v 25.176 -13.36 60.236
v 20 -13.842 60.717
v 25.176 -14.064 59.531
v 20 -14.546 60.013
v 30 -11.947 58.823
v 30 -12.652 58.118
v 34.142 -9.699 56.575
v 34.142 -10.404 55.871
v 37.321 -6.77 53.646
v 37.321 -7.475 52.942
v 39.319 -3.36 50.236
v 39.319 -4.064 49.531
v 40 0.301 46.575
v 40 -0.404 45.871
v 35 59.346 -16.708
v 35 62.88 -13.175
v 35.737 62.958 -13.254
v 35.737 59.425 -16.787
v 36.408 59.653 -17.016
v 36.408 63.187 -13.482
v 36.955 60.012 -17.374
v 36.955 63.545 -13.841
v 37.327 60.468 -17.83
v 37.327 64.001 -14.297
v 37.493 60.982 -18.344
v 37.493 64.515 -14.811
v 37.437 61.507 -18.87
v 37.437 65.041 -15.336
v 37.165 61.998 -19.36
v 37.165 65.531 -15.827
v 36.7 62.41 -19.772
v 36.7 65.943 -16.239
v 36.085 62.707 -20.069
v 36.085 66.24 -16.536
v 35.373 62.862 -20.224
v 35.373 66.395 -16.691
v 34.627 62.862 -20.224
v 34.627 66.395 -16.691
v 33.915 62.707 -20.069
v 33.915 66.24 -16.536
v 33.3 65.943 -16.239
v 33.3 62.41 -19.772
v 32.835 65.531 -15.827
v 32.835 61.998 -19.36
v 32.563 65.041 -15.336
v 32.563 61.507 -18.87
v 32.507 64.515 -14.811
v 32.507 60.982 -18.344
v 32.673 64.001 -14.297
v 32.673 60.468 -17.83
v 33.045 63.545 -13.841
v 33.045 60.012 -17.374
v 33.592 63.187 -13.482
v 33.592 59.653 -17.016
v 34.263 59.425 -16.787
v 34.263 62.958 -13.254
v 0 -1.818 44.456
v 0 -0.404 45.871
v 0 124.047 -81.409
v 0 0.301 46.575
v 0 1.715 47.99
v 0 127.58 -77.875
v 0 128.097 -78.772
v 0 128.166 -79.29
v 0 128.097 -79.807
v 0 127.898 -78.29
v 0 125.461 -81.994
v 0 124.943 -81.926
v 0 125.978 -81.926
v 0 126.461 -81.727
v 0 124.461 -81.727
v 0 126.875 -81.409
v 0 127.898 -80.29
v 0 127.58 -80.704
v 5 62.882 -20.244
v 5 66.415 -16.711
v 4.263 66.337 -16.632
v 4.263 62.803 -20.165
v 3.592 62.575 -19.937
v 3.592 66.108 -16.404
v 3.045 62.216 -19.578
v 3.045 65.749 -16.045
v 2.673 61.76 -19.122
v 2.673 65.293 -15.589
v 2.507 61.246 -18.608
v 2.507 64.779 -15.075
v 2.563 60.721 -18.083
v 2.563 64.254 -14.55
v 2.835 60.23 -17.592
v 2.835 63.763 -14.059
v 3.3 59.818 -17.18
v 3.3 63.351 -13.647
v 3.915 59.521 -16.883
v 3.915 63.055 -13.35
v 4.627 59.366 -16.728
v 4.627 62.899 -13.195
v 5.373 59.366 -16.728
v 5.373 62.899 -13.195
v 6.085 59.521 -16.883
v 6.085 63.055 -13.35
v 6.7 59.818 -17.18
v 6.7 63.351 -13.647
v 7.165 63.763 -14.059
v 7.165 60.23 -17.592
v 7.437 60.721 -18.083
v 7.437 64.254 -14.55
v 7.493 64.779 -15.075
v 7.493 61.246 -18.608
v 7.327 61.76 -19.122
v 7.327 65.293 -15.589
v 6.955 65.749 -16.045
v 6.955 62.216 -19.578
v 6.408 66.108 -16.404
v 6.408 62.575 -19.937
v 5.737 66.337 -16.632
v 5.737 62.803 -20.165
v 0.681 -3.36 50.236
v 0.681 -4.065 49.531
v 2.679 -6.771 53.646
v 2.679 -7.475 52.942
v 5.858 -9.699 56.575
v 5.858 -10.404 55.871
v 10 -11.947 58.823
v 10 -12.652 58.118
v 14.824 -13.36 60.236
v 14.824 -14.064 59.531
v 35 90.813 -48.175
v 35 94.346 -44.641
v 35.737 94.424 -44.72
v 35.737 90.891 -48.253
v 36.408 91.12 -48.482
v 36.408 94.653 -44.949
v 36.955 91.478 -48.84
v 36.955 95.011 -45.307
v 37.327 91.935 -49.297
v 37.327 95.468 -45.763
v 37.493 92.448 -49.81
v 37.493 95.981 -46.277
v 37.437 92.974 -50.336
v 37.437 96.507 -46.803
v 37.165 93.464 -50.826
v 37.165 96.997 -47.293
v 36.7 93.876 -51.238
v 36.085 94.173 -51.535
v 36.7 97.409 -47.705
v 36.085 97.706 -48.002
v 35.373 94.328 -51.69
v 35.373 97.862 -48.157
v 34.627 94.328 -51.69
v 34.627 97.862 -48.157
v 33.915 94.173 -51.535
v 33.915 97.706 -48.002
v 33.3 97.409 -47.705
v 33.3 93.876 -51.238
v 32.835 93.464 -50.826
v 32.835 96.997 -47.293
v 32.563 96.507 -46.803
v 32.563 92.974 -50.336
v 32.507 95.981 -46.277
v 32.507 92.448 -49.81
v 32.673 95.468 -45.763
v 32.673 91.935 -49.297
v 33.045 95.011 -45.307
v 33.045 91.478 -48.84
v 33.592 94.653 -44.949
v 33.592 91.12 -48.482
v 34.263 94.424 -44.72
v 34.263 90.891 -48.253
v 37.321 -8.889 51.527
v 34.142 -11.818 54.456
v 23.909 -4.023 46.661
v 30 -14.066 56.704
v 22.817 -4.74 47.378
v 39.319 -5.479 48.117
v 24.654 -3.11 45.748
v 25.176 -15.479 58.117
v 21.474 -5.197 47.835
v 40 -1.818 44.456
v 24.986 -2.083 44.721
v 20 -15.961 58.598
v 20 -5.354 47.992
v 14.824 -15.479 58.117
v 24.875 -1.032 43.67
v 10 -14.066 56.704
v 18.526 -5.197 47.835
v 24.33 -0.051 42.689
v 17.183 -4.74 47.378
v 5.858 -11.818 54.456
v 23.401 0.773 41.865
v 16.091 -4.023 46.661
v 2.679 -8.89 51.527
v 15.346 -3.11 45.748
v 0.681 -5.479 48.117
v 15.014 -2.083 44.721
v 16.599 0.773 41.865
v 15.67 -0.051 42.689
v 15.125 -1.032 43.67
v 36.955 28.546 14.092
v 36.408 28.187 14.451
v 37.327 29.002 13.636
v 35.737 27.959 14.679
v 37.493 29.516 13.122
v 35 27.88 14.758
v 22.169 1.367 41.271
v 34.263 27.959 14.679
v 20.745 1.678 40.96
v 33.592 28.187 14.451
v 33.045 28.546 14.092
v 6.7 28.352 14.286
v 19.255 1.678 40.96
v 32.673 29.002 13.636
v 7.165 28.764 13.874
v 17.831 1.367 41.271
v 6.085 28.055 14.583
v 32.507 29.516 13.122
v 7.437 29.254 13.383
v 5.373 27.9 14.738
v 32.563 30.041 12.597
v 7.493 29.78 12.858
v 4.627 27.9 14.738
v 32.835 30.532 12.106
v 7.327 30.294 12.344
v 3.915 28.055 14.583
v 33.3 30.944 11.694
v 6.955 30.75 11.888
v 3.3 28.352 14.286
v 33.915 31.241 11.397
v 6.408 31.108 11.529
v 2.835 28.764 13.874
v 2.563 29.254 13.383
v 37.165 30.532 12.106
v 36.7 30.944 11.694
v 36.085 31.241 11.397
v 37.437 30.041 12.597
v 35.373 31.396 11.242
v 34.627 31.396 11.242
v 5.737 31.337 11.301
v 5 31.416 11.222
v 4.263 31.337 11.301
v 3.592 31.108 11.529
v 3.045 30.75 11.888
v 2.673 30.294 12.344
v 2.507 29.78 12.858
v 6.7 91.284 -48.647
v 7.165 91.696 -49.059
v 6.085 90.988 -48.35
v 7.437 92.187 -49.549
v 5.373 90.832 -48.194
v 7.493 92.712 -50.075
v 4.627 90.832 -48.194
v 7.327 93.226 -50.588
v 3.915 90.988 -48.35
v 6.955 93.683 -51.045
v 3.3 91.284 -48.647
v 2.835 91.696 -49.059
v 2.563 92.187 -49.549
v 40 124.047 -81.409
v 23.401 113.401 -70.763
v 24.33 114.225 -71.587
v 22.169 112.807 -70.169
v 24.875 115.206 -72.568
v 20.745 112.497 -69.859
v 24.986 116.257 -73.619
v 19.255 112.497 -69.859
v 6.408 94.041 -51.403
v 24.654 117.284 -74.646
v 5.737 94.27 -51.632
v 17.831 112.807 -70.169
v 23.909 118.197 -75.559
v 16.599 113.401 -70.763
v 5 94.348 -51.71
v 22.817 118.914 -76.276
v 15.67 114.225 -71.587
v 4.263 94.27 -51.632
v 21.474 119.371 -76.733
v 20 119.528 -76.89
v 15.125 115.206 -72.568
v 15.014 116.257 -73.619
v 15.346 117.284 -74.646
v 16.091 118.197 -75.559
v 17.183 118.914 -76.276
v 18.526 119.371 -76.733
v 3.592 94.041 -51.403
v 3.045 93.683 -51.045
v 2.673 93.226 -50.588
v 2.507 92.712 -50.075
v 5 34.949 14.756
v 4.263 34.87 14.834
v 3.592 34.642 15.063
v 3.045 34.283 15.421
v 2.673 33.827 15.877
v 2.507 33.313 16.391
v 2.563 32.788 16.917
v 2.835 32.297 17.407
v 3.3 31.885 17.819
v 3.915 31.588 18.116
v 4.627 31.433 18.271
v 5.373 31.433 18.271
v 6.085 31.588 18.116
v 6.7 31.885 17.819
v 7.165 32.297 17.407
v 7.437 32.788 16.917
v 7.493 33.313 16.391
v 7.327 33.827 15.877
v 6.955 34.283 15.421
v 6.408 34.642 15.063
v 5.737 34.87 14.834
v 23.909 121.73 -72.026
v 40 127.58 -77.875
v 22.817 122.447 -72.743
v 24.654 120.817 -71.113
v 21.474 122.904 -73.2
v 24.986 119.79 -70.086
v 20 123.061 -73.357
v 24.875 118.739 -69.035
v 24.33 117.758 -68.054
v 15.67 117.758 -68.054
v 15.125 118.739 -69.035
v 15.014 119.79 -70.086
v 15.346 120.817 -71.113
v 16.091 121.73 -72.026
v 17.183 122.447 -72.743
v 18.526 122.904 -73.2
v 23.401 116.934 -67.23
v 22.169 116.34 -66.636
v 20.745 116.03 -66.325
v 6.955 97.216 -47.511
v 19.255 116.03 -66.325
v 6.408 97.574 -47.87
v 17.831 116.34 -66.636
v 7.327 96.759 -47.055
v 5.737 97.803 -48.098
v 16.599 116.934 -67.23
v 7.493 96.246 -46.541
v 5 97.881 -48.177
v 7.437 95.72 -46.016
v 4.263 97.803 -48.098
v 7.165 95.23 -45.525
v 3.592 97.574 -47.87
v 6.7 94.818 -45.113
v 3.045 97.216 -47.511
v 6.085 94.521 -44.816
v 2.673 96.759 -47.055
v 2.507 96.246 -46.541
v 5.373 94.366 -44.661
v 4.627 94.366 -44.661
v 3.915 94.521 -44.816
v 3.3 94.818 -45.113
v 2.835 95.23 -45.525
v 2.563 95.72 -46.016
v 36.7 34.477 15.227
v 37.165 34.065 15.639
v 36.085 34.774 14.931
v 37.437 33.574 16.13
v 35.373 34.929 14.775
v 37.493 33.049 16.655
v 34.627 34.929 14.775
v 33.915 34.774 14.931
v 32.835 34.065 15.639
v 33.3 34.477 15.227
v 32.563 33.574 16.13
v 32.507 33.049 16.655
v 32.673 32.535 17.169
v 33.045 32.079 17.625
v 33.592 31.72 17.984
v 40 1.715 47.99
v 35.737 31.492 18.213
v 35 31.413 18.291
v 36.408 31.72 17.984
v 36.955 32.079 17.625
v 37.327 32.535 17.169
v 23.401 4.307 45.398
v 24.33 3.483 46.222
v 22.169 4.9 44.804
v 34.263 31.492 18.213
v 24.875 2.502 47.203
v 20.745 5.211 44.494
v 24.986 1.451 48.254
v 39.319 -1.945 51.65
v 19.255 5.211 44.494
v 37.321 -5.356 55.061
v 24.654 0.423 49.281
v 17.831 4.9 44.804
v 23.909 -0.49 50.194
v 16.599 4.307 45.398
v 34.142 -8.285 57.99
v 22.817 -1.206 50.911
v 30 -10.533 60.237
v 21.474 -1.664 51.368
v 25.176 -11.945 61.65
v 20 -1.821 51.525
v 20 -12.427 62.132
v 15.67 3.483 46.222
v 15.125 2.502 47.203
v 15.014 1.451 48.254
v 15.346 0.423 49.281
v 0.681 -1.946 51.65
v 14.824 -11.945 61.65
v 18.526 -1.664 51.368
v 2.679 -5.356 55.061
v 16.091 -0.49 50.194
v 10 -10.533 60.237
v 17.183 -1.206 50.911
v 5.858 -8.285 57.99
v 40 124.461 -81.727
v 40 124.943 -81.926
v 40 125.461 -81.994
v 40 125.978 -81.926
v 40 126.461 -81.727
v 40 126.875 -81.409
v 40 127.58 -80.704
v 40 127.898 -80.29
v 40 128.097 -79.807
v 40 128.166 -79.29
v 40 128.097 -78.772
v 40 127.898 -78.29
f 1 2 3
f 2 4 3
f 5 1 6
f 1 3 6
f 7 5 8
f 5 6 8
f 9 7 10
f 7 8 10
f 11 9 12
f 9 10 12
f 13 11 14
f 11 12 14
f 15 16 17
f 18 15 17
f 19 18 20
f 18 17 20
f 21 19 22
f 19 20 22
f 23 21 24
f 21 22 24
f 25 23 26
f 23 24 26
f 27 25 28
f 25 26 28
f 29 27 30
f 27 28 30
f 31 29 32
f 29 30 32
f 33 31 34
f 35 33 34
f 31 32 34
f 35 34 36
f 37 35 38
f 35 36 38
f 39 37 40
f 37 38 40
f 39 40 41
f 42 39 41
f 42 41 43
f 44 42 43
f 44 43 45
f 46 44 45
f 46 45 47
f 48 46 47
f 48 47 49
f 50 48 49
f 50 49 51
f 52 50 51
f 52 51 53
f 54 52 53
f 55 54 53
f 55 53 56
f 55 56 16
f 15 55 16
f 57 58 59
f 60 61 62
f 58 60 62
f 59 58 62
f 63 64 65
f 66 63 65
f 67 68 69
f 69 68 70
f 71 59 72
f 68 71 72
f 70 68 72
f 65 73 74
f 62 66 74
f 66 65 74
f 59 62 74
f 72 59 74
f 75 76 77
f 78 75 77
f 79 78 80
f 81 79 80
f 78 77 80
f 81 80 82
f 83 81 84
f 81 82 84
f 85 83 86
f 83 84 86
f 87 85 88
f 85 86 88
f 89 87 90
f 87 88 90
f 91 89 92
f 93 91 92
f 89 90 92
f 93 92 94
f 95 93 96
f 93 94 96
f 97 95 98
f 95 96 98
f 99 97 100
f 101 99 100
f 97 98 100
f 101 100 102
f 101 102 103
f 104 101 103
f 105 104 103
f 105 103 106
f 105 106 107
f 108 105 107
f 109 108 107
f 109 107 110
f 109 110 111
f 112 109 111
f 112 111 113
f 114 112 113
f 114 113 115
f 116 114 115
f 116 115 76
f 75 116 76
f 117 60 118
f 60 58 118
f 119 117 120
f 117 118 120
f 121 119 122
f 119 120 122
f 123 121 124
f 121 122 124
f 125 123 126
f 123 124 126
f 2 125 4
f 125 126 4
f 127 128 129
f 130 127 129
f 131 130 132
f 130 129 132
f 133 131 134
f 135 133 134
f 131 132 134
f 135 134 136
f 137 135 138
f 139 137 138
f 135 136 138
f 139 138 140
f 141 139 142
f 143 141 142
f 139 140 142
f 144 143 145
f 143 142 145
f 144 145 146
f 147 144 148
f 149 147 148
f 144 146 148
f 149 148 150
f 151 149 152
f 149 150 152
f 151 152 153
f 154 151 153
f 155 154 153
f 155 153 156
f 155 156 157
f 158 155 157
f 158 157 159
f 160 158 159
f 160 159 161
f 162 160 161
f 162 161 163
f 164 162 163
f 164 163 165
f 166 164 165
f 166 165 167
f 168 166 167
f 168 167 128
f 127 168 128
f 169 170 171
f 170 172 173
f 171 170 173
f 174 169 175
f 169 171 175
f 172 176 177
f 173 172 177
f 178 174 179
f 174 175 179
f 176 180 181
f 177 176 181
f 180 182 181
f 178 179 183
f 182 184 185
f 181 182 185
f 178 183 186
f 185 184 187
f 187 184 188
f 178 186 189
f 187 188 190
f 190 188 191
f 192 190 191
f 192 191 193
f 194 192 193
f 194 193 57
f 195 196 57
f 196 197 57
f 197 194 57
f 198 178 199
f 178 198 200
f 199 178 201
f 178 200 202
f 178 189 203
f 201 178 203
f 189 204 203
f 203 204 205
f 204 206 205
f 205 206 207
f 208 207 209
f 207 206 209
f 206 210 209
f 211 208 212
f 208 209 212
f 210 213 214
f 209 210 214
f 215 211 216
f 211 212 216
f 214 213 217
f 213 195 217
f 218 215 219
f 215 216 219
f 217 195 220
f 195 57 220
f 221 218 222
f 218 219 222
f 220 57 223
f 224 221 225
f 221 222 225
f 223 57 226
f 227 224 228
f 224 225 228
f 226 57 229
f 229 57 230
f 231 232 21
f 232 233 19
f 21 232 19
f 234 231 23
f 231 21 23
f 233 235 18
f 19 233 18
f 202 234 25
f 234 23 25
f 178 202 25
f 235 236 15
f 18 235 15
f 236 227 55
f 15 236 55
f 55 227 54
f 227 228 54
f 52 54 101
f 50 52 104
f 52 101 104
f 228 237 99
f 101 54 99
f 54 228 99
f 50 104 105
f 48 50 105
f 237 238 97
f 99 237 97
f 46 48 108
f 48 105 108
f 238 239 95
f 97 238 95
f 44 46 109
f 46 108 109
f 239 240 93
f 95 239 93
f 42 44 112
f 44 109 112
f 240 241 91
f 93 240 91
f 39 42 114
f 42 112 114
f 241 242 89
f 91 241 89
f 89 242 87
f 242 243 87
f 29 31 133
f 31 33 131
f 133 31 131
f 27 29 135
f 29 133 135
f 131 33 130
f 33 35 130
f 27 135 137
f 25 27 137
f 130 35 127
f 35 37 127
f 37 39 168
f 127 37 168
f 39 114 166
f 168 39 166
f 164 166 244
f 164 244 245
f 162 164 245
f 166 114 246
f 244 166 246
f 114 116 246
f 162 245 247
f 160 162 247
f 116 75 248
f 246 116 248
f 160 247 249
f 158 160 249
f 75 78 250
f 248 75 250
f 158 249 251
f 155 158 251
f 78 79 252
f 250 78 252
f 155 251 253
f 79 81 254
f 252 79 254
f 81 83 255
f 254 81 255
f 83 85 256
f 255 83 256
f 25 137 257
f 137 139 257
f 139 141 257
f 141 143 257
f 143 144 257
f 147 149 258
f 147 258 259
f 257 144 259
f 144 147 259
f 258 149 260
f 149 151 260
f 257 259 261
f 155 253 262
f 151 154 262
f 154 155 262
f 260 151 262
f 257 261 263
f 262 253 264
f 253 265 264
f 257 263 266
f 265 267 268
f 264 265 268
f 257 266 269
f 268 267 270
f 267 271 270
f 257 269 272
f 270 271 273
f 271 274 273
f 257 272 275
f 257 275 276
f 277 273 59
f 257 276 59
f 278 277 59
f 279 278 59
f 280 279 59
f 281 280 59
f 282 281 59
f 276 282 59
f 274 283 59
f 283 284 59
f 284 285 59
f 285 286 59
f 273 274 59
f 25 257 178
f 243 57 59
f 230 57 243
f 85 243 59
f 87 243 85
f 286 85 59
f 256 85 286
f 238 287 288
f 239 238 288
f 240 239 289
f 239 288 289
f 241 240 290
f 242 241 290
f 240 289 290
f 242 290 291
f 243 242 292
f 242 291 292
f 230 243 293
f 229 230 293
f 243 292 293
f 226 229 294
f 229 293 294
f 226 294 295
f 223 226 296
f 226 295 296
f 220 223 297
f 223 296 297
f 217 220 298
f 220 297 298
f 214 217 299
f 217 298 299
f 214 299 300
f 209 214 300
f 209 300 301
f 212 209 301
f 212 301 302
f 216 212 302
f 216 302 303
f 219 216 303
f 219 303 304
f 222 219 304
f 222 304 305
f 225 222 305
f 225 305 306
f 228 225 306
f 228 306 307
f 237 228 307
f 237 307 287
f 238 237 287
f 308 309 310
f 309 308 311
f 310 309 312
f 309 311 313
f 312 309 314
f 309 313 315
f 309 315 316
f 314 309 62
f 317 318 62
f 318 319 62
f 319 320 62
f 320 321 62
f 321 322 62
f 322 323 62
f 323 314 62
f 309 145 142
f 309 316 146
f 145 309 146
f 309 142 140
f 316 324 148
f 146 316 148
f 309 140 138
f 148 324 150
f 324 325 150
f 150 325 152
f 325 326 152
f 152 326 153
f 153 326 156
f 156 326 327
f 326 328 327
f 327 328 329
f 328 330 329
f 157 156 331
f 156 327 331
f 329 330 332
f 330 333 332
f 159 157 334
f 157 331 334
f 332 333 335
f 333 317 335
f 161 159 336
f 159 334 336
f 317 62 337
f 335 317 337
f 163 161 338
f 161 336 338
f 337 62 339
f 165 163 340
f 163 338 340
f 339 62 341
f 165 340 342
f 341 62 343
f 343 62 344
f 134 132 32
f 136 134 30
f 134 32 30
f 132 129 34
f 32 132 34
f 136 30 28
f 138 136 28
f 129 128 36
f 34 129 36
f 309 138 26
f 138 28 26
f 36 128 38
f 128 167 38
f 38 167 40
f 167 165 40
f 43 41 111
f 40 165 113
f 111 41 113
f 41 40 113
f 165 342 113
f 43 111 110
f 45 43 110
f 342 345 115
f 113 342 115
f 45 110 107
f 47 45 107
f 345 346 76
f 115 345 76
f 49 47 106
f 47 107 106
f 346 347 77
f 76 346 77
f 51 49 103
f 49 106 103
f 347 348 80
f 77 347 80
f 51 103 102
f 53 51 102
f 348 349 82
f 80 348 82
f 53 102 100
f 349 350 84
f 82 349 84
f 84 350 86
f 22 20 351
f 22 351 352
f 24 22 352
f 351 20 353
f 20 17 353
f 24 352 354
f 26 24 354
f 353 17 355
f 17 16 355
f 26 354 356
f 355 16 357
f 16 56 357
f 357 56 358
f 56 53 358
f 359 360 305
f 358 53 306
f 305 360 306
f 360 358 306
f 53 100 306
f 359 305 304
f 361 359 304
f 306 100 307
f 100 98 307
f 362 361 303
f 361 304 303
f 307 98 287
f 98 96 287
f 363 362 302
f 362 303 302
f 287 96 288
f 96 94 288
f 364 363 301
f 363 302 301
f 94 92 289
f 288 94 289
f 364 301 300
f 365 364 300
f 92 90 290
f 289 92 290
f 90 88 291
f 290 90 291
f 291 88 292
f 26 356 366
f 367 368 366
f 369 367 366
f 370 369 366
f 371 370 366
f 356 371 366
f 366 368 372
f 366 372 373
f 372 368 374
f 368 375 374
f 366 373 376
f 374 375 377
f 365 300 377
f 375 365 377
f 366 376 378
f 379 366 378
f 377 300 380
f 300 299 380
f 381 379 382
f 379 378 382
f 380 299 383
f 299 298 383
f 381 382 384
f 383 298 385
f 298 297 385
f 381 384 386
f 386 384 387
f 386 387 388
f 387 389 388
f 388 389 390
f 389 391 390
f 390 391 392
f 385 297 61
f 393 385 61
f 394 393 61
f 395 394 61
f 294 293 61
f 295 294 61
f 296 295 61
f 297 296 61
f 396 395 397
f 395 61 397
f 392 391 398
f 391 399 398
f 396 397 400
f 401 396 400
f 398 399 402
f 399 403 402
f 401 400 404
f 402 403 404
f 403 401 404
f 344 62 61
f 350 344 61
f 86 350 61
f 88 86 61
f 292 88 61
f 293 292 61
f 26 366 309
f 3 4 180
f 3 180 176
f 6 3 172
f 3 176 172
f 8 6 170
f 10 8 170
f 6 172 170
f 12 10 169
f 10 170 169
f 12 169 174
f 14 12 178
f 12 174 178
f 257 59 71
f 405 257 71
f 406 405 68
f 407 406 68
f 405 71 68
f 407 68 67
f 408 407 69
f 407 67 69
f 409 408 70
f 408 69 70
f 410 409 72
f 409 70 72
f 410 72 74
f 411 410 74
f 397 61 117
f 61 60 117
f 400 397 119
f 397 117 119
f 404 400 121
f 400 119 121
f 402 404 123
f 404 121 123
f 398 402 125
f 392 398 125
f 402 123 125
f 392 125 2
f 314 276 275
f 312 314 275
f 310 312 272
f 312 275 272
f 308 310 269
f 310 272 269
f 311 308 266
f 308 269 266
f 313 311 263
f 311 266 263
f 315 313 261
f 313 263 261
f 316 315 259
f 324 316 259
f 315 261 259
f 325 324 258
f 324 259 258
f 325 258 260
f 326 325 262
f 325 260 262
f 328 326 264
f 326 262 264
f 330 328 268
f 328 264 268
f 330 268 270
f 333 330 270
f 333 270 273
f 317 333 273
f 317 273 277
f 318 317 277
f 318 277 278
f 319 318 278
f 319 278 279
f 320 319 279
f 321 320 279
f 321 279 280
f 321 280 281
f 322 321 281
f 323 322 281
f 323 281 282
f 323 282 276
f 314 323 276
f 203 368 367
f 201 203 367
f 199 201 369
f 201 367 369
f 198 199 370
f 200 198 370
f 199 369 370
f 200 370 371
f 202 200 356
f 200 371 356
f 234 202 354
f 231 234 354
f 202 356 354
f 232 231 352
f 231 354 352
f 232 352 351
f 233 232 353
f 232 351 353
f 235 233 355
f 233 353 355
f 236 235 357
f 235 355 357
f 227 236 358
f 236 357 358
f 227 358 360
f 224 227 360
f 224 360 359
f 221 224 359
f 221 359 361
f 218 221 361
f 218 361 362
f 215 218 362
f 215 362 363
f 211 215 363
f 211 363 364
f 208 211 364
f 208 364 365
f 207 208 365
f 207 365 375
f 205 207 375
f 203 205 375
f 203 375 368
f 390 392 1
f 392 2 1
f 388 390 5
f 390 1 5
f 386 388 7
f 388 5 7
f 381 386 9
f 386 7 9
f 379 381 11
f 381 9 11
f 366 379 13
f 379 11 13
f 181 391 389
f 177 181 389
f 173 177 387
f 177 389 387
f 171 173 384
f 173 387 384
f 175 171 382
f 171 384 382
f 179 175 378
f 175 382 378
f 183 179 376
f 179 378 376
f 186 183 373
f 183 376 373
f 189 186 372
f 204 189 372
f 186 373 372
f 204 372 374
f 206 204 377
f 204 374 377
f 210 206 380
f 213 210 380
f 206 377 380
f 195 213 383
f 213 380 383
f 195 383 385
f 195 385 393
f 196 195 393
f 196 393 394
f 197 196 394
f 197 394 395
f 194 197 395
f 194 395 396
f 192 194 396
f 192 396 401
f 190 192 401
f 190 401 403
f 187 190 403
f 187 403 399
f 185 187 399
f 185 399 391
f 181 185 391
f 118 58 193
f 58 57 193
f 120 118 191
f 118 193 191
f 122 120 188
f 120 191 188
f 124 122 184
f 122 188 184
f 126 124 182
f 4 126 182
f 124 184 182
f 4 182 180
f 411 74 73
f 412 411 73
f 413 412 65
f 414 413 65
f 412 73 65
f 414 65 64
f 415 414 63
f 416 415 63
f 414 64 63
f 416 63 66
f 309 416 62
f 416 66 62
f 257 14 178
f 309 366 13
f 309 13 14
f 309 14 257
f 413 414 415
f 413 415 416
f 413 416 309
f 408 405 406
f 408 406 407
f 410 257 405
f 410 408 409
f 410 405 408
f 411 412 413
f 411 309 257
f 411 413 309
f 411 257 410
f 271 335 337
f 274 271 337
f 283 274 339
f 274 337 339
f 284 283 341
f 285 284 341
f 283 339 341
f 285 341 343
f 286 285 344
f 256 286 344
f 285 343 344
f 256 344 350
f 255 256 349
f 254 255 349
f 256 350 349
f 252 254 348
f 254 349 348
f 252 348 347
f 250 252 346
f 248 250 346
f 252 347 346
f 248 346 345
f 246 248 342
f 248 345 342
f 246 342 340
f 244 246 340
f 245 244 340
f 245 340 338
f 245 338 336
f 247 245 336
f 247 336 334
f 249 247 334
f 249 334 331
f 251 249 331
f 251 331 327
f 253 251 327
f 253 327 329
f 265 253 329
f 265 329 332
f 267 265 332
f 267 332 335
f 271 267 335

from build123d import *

# Parameters (mm, degrees)
BOSS_EXTRUDE1_DEPTH = 40
FILLET3_R           = 20
FILLET4_R           = 20
SKETCH2_R           = 5
SKETCH2_R_2         = 2.5
CUT_EXTRUDE1_DEPTH  = 5
SKETCH3_R           = 5
CUT_EXTRUDE2_DEPTH  = 5


with BuildPart() as part:
    # Sketch1 → Boss-Extrude1 (new body)
    with BuildSketch(Plane(origin=(0, 0, 0), x_dir=(0, 0, -1), z_dir=(1, 0, 0))):
        with BuildLine():
            Line((-58.598472687, -15.960552102), (-57.184259125, -14.54633854))
            Line((-57.184259125, -14.54633854), (-34.253623627, 8.384296958))
            Line((-34.253623627, 8.384296958), (81.408669988, 124.046590573))
            ThreePointArc((81.408669988, 124.046590573), (81.994456425, 125.460804135), (81.408669988, 126.875017697))
            Line((81.408669988, 126.875017697), (80.703876553, 127.579811132))
            ThreePointArc((80.703876553, 127.579811132), (79.289662991, 128.165597569), (77.875449429, 127.579811132))
            Line((77.875449429, 127.579811132), (-37.786844186, 11.917517517))
            Line((-37.786844186, 11.917517517), (-60.717479684, -11.013117981))
            Line((-60.717479684, -11.013117981), (-62.131693246, -12.427331543))
            Line((-62.131693246, -12.427331543), (-60.717479684, -13.841545106))
            Line((-60.717479684, -13.841545106), (-60.01268625, -14.54633854))
            Line((-60.01268625, -14.54633854), (-58.598472687, -15.960552102))
        make_face()
    extrude(amount=BOSS_EXTRUDE1_DEPTH)

    # Fillet3
    fillet3_edges = [part.edges().sort_by_distance(p)[0] for p in [
        (40, -14.193941823, 60.365082967),
    ]]
    fillet(fillet3_edges, radius=FILLET3_R)

    # Fillet4
    fillet4_edges = [part.edges().sort_by_distance(p)[0] for p in [
        (0, -14.193941823, 60.365082967),
    ]]
    fillet(fillet4_edges, radius=FILLET4_R - 0.0001)  # a hair under: the kernel refuses the full size

    # Sketch2 → Cut-Extrude1 (cut)
    with BuildSketch(Plane(origin=(0, 24.852180852, 24.852180852), x_dir=(1, 0, 0), z_dir=(0, 0.7071067811865465, 0.7071067811865487))):
        with Locations(Location((20, -32.721192027, 0), (0, 0, 270))):
            Circle(SKETCH2_R)
        with Locations(Location((35, 100.778807973, 0), (0, 0, 270))):
            Circle(SKETCH2_R_2)
        with Locations(Location((35, 56.278807973, 0), (0, 0, 270))):
            Circle(SKETCH2_R_2)
        with Locations(Location((35, 11.778807973, 0), (0, 0, 270))):
            Circle(SKETCH2_R_2)
        with Locations(Location((5, 11.778807973, 0), (0, 0, 90))):
            Circle(SKETCH2_R_2)
        with Locations(Location((5, 56.278807973, 0), (0, 0, 90))):
            Circle(SKETCH2_R_2)
        with Locations(Location((5, 100.778807973, 0), (0, 0, 90))):
            Circle(SKETCH2_R_2)
    extrude(amount=-CUT_EXTRUDE1_DEPTH, mode=Mode.SUBTRACT)

    # Sketch3 → Cut-Extrude2 (cut)
    with BuildSketch(Plane(origin=(0, 21.318960292, 21.318960292), x_dir=(1, 0, 0), z_dir=(0, -0.7071067811865434, -0.7071067811865518))):
        with Locations(Location((20, -133.888702436, 0), (0, 0, 270))):
            Circle(SKETCH3_R)
    extrude(amount=-CUT_EXTRUDE2_DEPTH, mode=Mode.SUBTRACT)


solid = part.part
